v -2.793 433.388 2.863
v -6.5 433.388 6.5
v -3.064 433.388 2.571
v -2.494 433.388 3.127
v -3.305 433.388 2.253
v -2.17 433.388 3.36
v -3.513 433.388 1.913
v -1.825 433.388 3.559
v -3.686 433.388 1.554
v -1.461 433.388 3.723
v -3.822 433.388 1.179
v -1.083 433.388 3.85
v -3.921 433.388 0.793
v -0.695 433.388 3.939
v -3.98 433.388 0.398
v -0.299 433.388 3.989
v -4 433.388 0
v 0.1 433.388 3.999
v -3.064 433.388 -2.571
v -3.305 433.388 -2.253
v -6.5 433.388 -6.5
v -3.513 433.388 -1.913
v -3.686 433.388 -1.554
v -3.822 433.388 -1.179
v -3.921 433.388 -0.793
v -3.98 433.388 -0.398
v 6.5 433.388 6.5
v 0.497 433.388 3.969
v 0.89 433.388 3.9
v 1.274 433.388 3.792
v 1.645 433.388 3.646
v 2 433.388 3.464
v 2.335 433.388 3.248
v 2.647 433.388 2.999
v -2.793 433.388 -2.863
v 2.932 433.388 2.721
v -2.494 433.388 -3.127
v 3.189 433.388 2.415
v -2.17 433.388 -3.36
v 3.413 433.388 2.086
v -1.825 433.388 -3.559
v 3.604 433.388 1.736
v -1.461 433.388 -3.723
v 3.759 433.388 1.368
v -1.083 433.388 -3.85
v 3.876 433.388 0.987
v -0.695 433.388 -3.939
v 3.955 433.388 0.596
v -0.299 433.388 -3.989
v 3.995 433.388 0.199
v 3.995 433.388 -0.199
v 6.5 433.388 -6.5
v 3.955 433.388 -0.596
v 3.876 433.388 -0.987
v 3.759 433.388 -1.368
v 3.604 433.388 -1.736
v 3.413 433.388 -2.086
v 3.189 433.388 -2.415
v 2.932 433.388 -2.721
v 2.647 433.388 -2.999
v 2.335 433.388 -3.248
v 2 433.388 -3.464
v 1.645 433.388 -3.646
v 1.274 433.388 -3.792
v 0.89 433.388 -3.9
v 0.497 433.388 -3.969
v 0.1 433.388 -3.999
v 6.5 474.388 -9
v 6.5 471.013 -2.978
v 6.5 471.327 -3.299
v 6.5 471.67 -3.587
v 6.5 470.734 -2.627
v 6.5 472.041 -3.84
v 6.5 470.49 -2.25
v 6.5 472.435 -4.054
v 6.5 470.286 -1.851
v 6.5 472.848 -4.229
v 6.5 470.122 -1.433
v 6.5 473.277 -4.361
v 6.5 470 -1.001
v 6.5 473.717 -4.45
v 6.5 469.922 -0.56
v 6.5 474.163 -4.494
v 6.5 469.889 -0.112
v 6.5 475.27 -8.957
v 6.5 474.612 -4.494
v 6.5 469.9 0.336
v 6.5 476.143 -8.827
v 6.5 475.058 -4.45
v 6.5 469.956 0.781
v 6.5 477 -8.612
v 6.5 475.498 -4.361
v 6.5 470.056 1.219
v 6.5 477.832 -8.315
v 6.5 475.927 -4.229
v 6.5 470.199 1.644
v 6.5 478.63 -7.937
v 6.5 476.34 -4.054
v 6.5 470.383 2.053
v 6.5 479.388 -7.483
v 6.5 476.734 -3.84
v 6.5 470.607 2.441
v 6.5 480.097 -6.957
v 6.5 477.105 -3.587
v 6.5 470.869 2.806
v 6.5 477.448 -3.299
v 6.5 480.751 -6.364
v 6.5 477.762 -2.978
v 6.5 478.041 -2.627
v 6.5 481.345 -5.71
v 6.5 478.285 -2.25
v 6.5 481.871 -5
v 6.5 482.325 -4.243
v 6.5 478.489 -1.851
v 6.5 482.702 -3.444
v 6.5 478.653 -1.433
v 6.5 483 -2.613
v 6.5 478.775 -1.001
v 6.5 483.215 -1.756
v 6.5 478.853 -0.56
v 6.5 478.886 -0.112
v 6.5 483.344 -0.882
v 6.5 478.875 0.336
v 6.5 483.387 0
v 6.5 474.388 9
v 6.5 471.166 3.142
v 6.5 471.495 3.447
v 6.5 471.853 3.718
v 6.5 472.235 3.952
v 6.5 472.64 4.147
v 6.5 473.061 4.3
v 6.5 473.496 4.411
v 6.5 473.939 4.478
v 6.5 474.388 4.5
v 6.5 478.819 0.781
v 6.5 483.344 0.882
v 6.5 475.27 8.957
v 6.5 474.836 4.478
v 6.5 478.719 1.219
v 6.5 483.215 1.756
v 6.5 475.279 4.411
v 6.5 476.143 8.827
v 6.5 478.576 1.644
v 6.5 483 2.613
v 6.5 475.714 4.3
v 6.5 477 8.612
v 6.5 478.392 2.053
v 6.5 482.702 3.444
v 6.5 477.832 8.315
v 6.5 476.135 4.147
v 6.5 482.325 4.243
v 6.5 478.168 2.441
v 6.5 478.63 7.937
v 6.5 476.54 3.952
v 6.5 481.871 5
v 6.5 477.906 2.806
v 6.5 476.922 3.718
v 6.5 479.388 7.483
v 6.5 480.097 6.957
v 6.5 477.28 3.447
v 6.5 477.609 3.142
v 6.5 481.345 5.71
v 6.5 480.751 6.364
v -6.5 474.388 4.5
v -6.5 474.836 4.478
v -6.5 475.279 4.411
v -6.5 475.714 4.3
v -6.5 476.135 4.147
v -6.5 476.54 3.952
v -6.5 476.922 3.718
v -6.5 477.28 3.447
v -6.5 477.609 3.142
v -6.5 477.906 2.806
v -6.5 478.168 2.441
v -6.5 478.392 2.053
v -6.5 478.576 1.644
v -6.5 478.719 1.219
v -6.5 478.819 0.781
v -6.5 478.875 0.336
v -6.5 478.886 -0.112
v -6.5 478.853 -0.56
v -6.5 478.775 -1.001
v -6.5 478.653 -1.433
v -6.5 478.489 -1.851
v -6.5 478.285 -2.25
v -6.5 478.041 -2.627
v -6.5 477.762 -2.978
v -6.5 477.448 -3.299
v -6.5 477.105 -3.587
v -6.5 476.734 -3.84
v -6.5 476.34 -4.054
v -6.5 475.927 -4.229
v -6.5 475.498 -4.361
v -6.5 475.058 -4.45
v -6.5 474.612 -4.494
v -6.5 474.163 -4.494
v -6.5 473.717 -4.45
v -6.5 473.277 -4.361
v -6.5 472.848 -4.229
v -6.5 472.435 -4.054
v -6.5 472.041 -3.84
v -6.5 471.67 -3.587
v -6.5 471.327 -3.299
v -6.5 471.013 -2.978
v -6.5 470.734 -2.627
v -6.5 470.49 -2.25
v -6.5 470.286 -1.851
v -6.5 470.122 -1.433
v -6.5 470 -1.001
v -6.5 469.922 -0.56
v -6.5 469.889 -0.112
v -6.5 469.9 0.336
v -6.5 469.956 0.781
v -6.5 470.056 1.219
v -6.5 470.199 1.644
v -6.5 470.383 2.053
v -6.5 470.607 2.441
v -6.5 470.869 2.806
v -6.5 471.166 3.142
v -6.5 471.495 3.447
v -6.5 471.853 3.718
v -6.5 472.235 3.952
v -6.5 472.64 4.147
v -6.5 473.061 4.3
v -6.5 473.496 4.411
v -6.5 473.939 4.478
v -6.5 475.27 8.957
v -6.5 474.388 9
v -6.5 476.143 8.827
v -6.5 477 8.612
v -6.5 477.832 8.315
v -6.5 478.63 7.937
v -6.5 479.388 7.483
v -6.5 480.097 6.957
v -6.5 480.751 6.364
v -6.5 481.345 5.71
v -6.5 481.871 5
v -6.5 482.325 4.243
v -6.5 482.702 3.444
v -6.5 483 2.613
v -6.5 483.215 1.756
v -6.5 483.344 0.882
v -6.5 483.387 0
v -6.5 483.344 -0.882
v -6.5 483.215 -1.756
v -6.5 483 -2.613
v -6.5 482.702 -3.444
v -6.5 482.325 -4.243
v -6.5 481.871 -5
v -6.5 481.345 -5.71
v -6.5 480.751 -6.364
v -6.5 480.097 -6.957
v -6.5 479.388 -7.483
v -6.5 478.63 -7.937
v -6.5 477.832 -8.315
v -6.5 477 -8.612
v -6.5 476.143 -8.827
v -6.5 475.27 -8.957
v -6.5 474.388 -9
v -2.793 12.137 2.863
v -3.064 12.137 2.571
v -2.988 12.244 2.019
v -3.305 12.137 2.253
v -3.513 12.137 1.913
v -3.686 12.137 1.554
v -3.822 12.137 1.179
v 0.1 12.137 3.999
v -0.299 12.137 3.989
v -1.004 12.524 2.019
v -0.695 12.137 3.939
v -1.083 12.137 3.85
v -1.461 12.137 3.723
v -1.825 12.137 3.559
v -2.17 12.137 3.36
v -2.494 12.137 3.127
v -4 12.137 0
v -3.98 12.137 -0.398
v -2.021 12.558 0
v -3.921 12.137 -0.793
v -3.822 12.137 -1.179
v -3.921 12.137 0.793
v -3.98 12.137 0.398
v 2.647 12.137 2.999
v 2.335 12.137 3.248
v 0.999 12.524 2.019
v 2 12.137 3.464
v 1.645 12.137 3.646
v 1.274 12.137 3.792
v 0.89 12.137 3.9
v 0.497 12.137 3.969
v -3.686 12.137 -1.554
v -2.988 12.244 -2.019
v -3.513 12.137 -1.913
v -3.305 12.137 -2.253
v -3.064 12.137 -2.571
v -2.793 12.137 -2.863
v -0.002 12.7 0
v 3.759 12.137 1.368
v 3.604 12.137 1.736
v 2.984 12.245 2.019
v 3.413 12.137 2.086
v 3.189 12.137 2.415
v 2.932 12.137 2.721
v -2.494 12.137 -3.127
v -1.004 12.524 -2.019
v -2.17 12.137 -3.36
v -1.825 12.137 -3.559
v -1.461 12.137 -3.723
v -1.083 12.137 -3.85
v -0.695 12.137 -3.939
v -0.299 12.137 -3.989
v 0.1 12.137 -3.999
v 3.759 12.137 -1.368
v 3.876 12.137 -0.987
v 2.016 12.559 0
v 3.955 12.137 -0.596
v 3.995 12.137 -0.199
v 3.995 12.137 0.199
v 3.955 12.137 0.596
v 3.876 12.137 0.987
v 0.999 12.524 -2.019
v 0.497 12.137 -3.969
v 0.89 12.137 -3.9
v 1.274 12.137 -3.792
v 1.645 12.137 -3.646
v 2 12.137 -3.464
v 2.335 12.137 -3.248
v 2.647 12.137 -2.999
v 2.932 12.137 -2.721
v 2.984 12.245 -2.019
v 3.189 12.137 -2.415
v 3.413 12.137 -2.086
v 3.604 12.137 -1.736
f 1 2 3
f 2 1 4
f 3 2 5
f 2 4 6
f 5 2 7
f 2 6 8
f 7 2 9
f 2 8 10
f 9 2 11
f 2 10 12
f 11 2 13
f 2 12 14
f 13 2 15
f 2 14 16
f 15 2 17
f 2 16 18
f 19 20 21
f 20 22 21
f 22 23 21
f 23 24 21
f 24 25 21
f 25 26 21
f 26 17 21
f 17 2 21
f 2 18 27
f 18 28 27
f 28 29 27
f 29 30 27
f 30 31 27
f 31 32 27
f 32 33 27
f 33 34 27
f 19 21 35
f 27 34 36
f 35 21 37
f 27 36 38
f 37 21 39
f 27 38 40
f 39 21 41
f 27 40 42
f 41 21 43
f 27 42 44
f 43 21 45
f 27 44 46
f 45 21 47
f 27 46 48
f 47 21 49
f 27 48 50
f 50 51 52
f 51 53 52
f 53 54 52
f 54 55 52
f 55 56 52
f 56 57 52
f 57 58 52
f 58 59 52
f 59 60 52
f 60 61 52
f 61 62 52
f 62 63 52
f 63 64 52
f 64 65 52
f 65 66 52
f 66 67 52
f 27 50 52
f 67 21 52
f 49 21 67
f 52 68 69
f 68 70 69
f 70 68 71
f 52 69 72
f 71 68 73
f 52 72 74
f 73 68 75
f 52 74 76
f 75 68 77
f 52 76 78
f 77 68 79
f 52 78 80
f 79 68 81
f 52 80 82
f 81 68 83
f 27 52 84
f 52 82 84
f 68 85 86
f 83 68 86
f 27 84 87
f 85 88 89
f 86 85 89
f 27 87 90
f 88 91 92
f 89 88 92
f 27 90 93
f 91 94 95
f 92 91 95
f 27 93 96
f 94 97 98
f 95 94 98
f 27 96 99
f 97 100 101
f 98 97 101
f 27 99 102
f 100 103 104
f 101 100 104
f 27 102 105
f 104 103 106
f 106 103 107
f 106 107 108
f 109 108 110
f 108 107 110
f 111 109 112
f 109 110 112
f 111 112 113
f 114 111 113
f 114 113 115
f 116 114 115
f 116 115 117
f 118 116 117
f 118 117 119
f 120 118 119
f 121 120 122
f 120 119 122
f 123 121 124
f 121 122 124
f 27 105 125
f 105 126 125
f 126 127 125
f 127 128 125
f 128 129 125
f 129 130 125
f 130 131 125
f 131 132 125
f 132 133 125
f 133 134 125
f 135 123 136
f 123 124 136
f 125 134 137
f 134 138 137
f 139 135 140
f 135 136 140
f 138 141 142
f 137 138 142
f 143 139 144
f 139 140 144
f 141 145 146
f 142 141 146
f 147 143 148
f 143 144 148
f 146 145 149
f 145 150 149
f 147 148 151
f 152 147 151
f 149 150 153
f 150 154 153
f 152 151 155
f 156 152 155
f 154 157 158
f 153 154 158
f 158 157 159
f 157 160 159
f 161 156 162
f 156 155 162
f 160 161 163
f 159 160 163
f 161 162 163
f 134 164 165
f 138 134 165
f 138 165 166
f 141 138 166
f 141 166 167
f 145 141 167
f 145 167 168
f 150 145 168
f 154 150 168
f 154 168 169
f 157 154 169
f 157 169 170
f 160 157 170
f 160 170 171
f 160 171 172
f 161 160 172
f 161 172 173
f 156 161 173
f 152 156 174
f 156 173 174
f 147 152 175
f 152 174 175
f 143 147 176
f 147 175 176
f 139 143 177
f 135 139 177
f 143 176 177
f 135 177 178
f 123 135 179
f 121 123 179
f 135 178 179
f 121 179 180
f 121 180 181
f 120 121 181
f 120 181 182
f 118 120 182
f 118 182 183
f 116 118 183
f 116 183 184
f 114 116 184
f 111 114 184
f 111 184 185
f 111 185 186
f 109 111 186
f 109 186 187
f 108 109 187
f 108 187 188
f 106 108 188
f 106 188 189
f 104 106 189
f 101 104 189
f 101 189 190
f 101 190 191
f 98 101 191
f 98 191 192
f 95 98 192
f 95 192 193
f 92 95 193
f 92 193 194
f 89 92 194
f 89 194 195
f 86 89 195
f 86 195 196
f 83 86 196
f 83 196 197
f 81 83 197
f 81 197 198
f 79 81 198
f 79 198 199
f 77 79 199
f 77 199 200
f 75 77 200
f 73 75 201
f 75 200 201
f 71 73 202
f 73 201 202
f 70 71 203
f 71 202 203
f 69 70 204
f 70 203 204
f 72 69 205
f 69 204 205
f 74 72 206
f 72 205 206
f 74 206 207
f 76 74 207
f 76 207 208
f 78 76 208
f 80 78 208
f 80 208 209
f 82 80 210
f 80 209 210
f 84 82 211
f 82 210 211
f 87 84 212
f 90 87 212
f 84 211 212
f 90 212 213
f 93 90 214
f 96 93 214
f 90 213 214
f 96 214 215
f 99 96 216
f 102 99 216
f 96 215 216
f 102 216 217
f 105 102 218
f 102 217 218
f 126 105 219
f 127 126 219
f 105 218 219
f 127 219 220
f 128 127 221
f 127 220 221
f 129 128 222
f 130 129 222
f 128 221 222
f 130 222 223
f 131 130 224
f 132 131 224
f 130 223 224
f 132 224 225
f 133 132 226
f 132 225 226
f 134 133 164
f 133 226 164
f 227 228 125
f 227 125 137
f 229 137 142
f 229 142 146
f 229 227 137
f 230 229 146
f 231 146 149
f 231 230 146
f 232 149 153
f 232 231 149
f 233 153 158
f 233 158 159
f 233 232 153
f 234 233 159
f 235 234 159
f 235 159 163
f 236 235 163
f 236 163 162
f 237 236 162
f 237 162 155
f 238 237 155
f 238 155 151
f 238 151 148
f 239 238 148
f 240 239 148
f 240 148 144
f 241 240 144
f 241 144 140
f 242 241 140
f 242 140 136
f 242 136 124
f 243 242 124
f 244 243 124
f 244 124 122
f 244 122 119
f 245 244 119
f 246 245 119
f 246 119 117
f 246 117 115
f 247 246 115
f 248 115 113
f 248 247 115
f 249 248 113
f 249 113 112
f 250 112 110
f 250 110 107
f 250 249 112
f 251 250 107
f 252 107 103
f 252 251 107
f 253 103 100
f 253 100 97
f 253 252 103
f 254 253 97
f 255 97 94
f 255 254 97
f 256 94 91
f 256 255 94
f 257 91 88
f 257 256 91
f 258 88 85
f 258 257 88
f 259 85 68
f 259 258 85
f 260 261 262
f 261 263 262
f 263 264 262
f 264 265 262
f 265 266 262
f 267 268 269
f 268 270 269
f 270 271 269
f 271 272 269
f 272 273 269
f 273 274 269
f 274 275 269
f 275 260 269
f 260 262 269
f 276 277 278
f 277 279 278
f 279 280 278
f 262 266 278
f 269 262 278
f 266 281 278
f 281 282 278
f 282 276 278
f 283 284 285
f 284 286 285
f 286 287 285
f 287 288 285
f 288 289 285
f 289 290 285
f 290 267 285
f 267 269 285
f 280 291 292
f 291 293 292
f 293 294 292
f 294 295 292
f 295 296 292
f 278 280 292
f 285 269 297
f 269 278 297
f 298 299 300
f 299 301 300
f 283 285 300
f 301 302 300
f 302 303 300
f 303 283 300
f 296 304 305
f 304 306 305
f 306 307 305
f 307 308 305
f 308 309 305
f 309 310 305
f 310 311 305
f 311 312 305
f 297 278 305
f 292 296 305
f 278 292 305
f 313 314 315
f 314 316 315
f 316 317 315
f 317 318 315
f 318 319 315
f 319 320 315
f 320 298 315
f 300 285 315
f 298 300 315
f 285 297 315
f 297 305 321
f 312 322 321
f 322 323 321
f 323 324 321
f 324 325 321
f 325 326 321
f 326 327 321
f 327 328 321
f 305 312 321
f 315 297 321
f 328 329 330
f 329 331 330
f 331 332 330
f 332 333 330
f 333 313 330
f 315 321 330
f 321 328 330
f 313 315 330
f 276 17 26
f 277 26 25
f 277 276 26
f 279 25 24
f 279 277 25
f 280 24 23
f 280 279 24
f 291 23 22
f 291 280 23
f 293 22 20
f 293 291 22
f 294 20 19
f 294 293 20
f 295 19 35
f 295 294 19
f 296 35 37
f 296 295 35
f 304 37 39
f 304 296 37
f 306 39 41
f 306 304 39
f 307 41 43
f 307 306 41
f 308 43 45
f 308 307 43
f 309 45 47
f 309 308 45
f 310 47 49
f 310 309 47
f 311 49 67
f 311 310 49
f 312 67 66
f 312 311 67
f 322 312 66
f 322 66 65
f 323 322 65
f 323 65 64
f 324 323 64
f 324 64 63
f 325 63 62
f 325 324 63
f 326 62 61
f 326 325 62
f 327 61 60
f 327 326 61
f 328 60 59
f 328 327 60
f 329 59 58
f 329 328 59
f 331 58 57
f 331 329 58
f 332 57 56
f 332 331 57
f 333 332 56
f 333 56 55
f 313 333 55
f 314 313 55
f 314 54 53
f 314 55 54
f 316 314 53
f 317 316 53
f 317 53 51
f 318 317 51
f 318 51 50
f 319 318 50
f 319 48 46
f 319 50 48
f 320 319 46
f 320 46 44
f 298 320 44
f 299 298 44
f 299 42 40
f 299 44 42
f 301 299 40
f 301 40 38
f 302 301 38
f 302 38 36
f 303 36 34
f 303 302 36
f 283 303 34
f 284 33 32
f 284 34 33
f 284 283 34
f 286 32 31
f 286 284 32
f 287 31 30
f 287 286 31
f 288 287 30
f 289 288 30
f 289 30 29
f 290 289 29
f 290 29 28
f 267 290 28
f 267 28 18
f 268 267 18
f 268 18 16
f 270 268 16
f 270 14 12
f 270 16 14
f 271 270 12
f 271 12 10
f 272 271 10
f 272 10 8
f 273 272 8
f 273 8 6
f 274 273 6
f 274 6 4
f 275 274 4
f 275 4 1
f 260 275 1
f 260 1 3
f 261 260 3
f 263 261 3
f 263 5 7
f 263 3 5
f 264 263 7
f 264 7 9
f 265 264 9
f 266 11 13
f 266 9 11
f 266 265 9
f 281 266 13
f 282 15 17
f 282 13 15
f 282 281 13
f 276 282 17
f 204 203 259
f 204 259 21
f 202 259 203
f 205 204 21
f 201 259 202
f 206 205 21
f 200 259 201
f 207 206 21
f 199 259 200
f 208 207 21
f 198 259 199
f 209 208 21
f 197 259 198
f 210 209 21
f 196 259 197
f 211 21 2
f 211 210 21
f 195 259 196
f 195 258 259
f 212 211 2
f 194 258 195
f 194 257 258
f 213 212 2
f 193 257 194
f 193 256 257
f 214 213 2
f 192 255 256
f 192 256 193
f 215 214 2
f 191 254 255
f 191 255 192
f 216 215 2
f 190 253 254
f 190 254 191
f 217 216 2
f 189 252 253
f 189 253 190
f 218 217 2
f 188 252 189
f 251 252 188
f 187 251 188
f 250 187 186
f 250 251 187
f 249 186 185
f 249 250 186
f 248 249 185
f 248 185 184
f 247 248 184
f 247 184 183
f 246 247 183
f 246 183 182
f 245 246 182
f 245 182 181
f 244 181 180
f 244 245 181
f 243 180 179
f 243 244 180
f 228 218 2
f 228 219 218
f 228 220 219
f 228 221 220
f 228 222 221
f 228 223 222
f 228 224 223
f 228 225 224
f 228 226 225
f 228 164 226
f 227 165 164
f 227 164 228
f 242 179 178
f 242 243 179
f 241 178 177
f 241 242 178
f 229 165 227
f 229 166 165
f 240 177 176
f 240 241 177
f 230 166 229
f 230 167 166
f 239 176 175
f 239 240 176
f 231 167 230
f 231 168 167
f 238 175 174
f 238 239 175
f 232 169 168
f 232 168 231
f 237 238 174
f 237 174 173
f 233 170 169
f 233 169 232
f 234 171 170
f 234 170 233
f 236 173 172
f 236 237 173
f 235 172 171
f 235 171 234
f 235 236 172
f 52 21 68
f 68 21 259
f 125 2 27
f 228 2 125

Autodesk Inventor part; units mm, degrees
ref_plane "YZ Plane" through (0, 0, 0) normal (1, 0, 0) x (0, 1, 0)
ref_plane "XZ Plane" through (0, 0, 0) normal (0, 1, 0) x (-1, 0, 0)
ref_plane "XY Plane" through (0, 0, 0) normal (0, 0, 1) x (1, 0, 0)
sketch "Sketch1" plane through (0, 0, 0) normal (0, 1, 0) x (-1, 0, 0)
  circle A0 centre (0, 0) radius 4
  dimension "d0" = 8
extrude "Extrusion1" add sketch "Sketch1" along normal blind 433.3875
sketch "Sketch2" plane through (0, 433.3875, 0) normal (0, 1, 0) x (1, 0, 0)
  circle A0 centre (0, 0) radius 4 projected
  line L0 (6.5, -6.5) -> (-6.5, -6.5)
  line L1 (-6.5, -6.5) -> (-6.5, 6.5)
  line L2 (-6.5, 6.5) -> (6.5, 6.5)
  line L3 (6.5, 6.5) -> (6.5, -6.5)
  line L4 (6.5, -6.5) -> (-6.5, 6.5) construction
  line L5 (-6.5, -6.5) -> (6.5, 6.5) construction
  dimension "d3" = 13
  dimension "d4" = 13
extrude "Extrusion2" add sketch "Sketch2" along normal blind 41 contours A0 | L0 L1 L2 L3
sketch "Sketch3" plane through (-6.5, 433.3875, -6.5) normal (-1, 0, 0) x (0, 0, 1)
  line L0 (13, 0) -> (13, 41) projected
  line L1 (0, 0) -> (0, 41) projected
  line L2 (13, 41) -> (0, 41) projected
  arc A0 (15.4333, 39.9065) -> (-2.4333, 39.9065) centre (6.5, 41) ccw
  line L3 (13, 0) -> (15.5, 41)
  line L4 (0, 0) -> (-2.5, 41)
  point P0 (6.5, -433.3875)
  dimension "d7" = 18
extrude "Extrusion3" add sketch "Sketch3" against normal blind 13 contours L0 L2 L1 L4 A0 L3
sketch "Sketch4" plane through (-6.5, 474.3875, 0) normal (-1, 0, 0) x (0, 0, 1)
  arc A0 (9, 0) -> (-9, 0) centre (0, 0) ccw projected
  circle A1 centre (0, 0) radius 4.5
  point P0 (0, -474.3875)
  dimension "d11" = 9
extrude "Extrusion4" cut sketch "Sketch4" against normal blind 15
sketch "Sketch5" plane through (6.5, 433.3875, 6.5) normal (1, 0, 0) x (0, 0, -1)
  line L0 (13, 0) -> (15.5, 41) projected
  line L1 (13, 0) -> (14.2173, 19.9629)
  circle A0 centre (6.5, 41) radius 4.5 projected
  line L2 (14.2173, 19.9629) -> (6.5, 41)
  line L3 (14.2173, 19.9629) -> (6.5, 41)
  line L4 (6.5, 41) -> (7.4388, 41.3444)
  line L5 (7.4388, 41.3444) -> (15.1561, 20.3073)
  line L6 (15.1561, 20.3073) -> (14.2173, 19.9629)
  point P0 (6.5, -433.3875)
  dimension "d25" = 20
  dimension "d26" = 1
extrude "Extrusion5" [suppressed]
sketch "Sketch6" plane through (6.5, 433.3875, -6.5) normal (0, -0.0609, -0.9981) x (-1, 0, 0)
  line L0 (13, 20) -> (0, 20) projected
  line L1 (13, 0) -> (0, 0) projected
  line L2 (6.5, 0) -> (6.5, 32)
  point P0 (6.5, -432.9797)
  dimension "d29" = 32
hole "Hole2" [suppressed]
thread "Thread2" size "M3x0.5" class "6H" standard "ANSI Metric M Profile" full length
sketch "Sketch7" plane through (0, 0, 0) normal (1, 0, 0) x (0, 1, 0)
  line L0 (0, 0) -> (12.7, 0)
  line L1 (0, 0) -> (-16.3, 0)
  line L2 (0, 0) -> (-1.8, 0)
  arc A0 (-1.8, 14.5) -> (-1.8, -14.5) centre (-1.8, 0) ccw
  line L3 (-1.8, 14.5) -> (-1.8, -14.5)
  dimension "d41" = 12.7
  dimension "d43" = 1.8
revolve "Revolution1" cut sketch "Sketch7" angle 360 about axis through (0, -1.8, 14.5) along (0, 0, -1)
properties part number "Rod"
